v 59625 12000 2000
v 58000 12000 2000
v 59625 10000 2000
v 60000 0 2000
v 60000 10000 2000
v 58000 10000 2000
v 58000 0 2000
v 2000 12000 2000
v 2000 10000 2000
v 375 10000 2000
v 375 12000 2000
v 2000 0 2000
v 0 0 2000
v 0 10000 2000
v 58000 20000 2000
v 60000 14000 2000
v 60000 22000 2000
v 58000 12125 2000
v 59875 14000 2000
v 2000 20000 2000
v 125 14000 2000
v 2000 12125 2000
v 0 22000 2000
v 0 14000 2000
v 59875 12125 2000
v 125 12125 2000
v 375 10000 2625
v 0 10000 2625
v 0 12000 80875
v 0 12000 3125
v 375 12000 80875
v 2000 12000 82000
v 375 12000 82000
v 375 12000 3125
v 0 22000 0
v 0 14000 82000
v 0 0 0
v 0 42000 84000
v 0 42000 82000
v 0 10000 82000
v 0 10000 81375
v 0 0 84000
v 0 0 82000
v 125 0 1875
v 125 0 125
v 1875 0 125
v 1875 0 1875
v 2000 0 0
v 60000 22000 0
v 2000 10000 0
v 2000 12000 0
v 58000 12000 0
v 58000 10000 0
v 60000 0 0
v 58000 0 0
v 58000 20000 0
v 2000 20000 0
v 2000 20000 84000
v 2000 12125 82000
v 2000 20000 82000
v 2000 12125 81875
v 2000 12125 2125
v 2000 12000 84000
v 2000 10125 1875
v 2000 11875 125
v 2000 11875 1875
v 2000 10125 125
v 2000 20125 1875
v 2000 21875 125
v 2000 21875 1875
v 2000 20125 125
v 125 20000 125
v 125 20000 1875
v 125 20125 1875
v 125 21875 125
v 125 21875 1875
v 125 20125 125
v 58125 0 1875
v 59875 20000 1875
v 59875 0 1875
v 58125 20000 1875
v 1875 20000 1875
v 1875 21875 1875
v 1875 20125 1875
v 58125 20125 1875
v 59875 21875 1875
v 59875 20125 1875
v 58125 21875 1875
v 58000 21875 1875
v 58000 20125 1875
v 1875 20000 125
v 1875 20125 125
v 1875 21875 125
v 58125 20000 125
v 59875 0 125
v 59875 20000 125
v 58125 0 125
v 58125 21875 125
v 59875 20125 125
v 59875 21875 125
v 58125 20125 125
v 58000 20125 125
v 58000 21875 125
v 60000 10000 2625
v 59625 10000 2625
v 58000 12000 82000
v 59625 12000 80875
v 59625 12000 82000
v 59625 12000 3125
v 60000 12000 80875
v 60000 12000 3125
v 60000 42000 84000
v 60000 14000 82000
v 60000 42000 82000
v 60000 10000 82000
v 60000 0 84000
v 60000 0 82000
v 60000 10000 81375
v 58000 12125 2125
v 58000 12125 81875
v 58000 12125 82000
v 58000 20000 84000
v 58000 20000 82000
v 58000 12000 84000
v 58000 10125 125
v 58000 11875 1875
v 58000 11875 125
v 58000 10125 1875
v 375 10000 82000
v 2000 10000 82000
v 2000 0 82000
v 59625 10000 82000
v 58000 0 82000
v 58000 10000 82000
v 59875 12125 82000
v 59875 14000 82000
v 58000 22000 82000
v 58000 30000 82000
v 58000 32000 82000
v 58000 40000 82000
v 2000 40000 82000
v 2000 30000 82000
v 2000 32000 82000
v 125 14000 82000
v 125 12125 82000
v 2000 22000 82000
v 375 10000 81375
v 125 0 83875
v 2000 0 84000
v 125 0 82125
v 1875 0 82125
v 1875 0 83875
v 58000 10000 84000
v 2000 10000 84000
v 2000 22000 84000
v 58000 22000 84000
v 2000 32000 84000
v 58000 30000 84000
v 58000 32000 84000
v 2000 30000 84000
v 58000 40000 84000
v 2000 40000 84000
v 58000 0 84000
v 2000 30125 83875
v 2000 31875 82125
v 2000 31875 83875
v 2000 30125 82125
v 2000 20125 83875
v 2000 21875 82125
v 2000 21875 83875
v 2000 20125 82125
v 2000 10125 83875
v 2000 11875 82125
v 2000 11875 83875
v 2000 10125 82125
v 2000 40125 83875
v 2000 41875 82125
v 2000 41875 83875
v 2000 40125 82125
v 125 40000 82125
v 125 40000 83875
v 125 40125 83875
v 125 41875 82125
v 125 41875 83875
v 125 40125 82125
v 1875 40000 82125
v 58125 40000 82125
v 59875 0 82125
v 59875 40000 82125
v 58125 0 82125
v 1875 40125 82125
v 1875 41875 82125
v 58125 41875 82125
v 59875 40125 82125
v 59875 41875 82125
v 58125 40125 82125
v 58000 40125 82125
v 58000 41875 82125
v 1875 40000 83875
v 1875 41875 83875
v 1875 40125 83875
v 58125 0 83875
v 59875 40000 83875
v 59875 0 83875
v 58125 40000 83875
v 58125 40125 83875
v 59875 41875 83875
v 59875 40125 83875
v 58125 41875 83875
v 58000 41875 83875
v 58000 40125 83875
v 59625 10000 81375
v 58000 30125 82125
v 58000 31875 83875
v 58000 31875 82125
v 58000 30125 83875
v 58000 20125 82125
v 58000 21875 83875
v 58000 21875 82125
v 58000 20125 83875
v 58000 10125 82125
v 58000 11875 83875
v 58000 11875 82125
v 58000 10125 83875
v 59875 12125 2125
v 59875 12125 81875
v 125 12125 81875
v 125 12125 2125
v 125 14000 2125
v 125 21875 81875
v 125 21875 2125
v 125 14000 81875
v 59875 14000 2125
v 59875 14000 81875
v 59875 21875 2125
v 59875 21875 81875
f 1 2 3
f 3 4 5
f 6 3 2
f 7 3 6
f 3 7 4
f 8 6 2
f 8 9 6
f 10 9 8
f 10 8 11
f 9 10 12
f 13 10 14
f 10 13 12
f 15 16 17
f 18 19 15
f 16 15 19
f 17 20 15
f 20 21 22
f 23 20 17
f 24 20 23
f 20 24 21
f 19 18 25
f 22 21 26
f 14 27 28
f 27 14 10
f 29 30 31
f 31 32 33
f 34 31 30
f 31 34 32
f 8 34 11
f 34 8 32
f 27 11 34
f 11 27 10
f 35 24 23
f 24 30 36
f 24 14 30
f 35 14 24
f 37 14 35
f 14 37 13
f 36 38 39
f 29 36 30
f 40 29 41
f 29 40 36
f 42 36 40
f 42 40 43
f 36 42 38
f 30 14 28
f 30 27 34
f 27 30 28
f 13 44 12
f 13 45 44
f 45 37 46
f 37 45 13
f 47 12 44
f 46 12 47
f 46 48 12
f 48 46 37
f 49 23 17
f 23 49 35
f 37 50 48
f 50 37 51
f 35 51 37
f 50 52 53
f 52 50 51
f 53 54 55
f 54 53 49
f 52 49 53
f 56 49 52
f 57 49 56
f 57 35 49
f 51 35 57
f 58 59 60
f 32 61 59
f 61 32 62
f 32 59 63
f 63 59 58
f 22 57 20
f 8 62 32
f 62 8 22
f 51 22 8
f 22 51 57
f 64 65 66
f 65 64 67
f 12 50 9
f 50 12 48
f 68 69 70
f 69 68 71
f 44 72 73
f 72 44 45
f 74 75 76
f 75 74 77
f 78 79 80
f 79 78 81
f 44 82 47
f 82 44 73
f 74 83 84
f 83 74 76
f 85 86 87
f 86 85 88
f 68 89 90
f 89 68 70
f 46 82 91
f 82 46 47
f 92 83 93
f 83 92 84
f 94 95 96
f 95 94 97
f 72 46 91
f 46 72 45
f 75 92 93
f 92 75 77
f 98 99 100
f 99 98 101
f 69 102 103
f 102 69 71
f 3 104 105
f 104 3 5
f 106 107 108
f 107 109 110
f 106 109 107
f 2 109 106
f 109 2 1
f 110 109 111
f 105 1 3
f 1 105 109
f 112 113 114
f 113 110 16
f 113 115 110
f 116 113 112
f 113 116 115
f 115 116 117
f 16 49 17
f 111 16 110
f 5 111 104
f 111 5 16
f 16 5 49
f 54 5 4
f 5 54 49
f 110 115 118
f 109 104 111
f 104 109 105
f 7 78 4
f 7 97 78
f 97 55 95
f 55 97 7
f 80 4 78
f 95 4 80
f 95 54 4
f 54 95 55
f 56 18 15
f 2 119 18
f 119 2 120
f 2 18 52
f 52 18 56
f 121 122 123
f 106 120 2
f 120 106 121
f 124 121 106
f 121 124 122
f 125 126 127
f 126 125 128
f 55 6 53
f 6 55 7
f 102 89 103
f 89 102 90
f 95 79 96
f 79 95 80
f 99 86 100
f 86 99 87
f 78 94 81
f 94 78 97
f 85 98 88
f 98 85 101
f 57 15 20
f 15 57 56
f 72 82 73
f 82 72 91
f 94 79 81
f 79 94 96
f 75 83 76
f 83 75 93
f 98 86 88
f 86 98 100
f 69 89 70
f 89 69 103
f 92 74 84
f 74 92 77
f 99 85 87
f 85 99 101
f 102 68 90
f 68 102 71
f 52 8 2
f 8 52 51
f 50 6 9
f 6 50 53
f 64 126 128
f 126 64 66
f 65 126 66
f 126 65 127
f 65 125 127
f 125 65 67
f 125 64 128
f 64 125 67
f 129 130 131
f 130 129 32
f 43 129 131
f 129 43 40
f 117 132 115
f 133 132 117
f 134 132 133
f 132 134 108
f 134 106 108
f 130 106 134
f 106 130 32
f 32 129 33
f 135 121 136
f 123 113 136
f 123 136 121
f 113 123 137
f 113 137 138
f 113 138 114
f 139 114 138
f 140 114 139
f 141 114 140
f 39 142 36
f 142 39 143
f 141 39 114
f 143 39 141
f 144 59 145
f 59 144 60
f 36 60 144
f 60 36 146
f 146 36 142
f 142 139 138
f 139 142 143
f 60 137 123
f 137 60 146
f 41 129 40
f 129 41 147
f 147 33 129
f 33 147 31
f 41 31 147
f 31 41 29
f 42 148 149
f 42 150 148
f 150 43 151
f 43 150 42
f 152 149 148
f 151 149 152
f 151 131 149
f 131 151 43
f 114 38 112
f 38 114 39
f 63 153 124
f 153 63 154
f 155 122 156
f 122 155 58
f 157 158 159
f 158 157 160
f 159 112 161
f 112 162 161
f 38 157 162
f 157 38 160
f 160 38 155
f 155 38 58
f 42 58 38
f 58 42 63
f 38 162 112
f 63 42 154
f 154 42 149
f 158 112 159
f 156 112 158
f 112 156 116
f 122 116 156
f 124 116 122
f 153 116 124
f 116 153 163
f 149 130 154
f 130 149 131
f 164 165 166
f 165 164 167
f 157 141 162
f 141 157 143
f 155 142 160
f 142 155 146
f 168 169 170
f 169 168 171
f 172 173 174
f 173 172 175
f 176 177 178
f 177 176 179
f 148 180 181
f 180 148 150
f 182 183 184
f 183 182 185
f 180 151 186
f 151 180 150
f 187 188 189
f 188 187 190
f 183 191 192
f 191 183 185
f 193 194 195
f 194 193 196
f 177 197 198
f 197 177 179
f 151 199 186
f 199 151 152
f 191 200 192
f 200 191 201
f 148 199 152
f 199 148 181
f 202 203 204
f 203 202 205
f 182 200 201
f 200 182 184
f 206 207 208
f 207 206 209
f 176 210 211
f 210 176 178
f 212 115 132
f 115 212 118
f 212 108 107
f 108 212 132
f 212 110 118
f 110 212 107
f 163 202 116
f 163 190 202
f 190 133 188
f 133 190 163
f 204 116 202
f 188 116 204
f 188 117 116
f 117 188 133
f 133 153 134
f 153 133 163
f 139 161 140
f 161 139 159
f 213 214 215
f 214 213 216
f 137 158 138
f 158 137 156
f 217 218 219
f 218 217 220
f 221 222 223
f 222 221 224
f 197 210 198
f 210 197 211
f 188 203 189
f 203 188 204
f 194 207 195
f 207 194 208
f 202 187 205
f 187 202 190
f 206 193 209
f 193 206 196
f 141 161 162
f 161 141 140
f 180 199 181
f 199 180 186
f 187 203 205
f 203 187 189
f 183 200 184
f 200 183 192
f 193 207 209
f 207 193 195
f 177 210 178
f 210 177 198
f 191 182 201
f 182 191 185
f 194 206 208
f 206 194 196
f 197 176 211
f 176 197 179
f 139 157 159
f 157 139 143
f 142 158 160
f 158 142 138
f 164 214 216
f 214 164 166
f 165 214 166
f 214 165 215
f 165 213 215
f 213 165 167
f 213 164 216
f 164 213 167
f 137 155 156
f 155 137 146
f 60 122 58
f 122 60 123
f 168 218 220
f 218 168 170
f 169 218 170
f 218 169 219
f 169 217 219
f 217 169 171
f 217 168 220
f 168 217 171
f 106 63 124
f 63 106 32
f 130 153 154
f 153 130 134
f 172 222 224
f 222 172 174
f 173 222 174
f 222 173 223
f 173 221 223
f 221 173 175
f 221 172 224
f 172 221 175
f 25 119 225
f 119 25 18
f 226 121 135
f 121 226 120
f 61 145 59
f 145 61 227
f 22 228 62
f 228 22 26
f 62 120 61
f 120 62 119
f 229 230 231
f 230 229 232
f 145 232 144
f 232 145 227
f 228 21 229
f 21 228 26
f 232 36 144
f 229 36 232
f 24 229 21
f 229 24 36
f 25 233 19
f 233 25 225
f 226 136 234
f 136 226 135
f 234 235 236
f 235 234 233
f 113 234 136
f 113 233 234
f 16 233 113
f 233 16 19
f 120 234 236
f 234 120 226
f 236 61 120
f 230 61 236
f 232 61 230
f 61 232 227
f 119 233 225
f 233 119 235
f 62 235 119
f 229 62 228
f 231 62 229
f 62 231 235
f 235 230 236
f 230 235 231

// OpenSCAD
// 1000 = 1 inch
// Port and starboard are from the perspective of sitting up in bed

// Queen bed
MATTRESS_HEIGHT = 10 * 1000;
MATTRESS_WIDTH = 60 * 1000;
MATTRESS_LENGTH = 80 * 1000;



/*//////////////////////////////////////////////////////
//                                                    //
//                      PRIMITIVES                    //
//                                                    //
//////////////////////////////////////////////////////*/


module BoxProfile(width, height, thickness) {
    difference() {
        square([width, height]);
    translate([thickness/2, thickness/2])
        square([width - thickness, height - thickness]);
    }
}

module BoxSection(length, width, height, thickness) {
    linear_extrude(length) {
        BoxProfile(width, height, thickness);
    }
}

module LProfile(width, height, thickness) {
    square([thickness, height]);
    square([width, thickness]);
}

module LSection(length, width, height, thickness) {
    linear_extrude(length) {
        LProfile(width, height, thickness);
    }
}

module Fin() {
    linear_extrude(125)
        polygon([
            [0, 0],
            [500, 0],
            [1000, 2000],
            [0, 2000]
        ]);
}

module FinSlot() {
    translate([0, 0, 125])
        linear_extrude(125)
            polygon([
                [0, 0],
                [500, 0],
                [1000, 2000],
                [0, 2000]
            ]);
    translate([0, 0, -125])
        linear_extrude(125)
            polygon([
                [0, 0],
                [500, 0],
                [1000, 2000],
                [0, 2000]
            ]);
    translate([125, 0, -125])
        linear_extrude(375)
            polygon([
                [500 - 125, 0],
                [500, 0],
                [1000, 2000],
                [1000 - 125, 2000]
            ]);
}



/*//////////////////////////////////////////////////////
//                                                    //
//                      COMPONENTS                    //
//                                                    //
//////////////////////////////////////////////////////*/


module LegAssembly(height) {
    rotate([-90, 0, 0])
        translate([0, -2000, 0])
            BoxSection(height, 2000, 2000, 250);
    rotate([0, 90, 0])
        translate([0, MATTRESS_HEIGHT, 125])
            FinSlot();
}

module Footboard() {
    HEIGHT = 22 * 1000;

    // port leg
    mirror([0,0,1])
        translate([0, 0, -2000])
                LegAssembly(HEIGHT);

    // starboard leg
    translate([MATTRESS_WIDTH, 0, 2000])
        rotate([0,180,0])
                LegAssembly(HEIGHT);

    // top pieces are not longer and are not translated,
    // as a miter joint
    translate([0, HEIGHT - 2000, 2000])
        rotate([0, 90, 0])
            BoxSection(MATTRESS_WIDTH, 2000, 2000, 250);

    // non-top pieces are shorter and translated, as a
    // butt joint
    translate([2000, MATTRESS_HEIGHT, 2000])
        rotate([0, 90, 0])
            BoxSection(MATTRESS_WIDTH - 4000, 2000, 2000, 250);

}

module Headboard() {
    HEIGHT = MATTRESS_HEIGHT * 4 + 2000;

    // port
    LegAssembly(HEIGHT);

    // startboard
    translate([MATTRESS_WIDTH, 0, 0])
        mirror([1,0,0])
            LegAssembly(HEIGHT);

    // top pieces are not longer and are not translated,
    // as a miter joint
    translate([0, MATTRESS_HEIGHT * 4, 2000])
        rotate([0, 90, 0])
            BoxSection(MATTRESS_WIDTH, 2000, 2000, 250);

    // non-top pieces are shorter and translated, as a
    // butt joint
    translate([2000, MATTRESS_HEIGHT * 3, 2000])
        rotate([0, 90, 0])
            BoxSection(MATTRESS_WIDTH - 4000, 2000, 2000, 250);

    translate([2000, MATTRESS_HEIGHT * 2, 2000])
        rotate([0, 90, 0])
            BoxSection(MATTRESS_WIDTH - 4000, 2000, 2000, 250);

    translate([2000, MATTRESS_HEIGHT, 2000])
        rotate([0, 90, 0])
            BoxSection(MATTRESS_WIDTH - 4000, 2000, 2000, 250);

}

module SideRail() {
    // side rail
    translate([0, MATTRESS_HEIGHT + 2000, 2000])
        LSection(MATTRESS_LENGTH, 2000, 2000, 125);

    // footboard fin
    rotate([0,270,0])
        translate([2000, MATTRESS_HEIGHT, -250])
            Fin();

    // headboard fin
    rotate([0,90,0])
        translate([-MATTRESS_LENGTH - 2000, MATTRESS_HEIGHT, 125])
            Fin();
}

module Mattress(width, height, thickness) {
    translate([125, 125, 125])
    cube([width - 250, thickness - 250, height - 250]);
}


/*//////////////////////////////////////////////////////
//                                                    //
//                       ASSEMBLY                     //
//                                                    //
//////////////////////////////////////////////////////*/


translate([0, 2000 + MATTRESS_HEIGHT, 2000])
    color("gray", 0.5)
        Mattress(MATTRESS_WIDTH, MATTRESS_LENGTH, 10 * 1000);

Footboard();

translate([0, 0, MATTRESS_LENGTH + 2000])
    Headboard();

// port
SideRail();

// starboard
translate([MATTRESS_WIDTH, 0, 0])
    mirror([1,0,0])
        SideRail();
